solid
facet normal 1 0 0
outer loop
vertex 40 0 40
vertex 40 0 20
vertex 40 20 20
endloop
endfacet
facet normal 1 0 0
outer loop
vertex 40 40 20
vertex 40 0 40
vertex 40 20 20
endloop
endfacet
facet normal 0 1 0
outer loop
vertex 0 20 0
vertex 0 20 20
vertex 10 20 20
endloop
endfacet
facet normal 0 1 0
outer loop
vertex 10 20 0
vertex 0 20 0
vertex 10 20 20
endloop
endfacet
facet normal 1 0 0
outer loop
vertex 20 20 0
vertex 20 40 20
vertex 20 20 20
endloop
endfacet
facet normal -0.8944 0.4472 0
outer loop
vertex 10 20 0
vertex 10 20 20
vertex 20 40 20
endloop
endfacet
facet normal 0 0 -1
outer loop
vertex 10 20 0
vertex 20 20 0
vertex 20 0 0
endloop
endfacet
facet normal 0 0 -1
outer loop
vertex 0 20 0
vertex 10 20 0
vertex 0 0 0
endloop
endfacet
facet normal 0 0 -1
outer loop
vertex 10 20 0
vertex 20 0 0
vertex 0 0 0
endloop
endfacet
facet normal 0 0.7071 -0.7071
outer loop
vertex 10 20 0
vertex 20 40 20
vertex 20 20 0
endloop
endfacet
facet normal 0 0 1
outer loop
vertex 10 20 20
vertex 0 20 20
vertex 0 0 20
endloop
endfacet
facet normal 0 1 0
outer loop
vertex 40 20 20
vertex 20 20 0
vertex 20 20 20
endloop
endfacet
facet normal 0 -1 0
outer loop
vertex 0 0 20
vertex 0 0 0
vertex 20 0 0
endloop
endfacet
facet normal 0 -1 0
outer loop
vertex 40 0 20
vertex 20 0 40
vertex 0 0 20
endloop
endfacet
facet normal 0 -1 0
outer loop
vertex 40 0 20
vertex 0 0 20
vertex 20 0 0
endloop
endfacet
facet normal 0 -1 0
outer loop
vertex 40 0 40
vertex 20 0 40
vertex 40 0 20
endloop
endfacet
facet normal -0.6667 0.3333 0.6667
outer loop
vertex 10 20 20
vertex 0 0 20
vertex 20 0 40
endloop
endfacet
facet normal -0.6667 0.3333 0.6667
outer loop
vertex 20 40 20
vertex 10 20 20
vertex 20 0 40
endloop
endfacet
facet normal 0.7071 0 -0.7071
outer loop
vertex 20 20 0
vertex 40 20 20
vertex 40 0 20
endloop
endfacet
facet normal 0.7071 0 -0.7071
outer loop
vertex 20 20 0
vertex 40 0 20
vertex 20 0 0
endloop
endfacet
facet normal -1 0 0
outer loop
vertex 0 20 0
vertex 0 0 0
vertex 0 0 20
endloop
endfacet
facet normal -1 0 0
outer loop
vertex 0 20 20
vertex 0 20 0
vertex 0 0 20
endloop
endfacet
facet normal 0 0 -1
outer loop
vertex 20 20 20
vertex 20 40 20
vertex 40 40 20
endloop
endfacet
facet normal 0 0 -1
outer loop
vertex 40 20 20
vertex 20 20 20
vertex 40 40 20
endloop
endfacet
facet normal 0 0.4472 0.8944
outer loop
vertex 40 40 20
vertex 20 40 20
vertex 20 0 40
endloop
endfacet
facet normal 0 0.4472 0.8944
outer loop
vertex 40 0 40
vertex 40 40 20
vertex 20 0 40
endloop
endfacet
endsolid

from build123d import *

# Parameters (mm, degrees)
SKETCH1_W           = 40
SKETCH1_H           = 20
BOSS_EXTRUDE1_DEPTH = 40
CUT_EXTRUDE1_DEPTH  = 40
CUT_EXTRUDE2_DEPTH  = 40
BOSS_EXTRUDE2_DEPTH = 20
BOSS_EXTRUDE3_DEPTH = 20
SKETCH6_W           = 40
SKETCH6_H           = 40
CUT_EXTRUDE3_DEPTH  = 20
SKETCH7_W           = 28.284271247
SKETCH7_H           = 20
CUT_EXTRUDE4_DEPTH  = 20
SKETCH8_W           = 20
SKETCH8_H           = 20
CUT_EXTRUDE5_DEPTH  = 20
CUT_EXTRUDE6_DEPTH  = 20
CUT_EXTRUDE7_DEPTH  = 20
SKETCH11_W          = 20
SKETCH11_H          = 20
CUT_EXTRUDE8_DEPTH  = 20
SKETCH12_W          = 20
SKETCH12_H          = 20
BOSS_EXTRUDE4_DEPTH = 20
CUT_EXTRUDE9_DEPTH  = 20
CUT_EXTRUDE10_DEPTH = 20


with BuildPart() as part:
    # Sketch1 → Boss-Extrude1 (new body)
    with BuildSketch(Plane.XY):
        with Locations((20, 10)):
            Rectangle(SKETCH1_W, SKETCH1_H)
    extrude(amount=BOSS_EXTRUDE1_DEPTH)

    # Sketch2 → Cut-Extrude1 (cut)
    with BuildSketch(Plane(origin=(0, 20, 0), x_dir=(1, 0, 0), z_dir=(0, 1, 0))):
        Polygon((0, -20), (20, -40), (0, -40), align=None)
    extrude(amount=-CUT_EXTRUDE1_DEPTH, mode=Mode.SUBTRACT)

    # Sketch3 → Cut-Extrude2 (cut)
    with BuildSketch(Plane(origin=(0, 20, 0), x_dir=(1, 0, 0), z_dir=(0, 1, 0))):
        Polygon((20, -40), (20, -20), (0, -20), align=None)
    extrude(amount=-CUT_EXTRUDE2_DEPTH, mode=Mode.SUBTRACT)

    # Sketch4 → Boss-Extrude2 (add)
    with BuildSketch(Plane(origin=(0, 20, 0), x_dir=(1, 0, 0), z_dir=(0, 1, 0))):
        Polygon((0, 0), (0, -20), (40, -20), (20, 0), align=None)
    extrude(amount=BOSS_EXTRUDE2_DEPTH)

    # Sketch5 → Boss-Extrude3 (add)
    with BuildSketch(Plane(origin=(-8.888888889, 4.444444444, 8.888888889), x_dir=(0.745355992, 0.298142397, 0.596284794), z_dir=(-0.666666667, 0.333333333, 0.666666667))):
        Polygon((11.92569588, -8.94427191), (38.75851161, -17.88854382), (38.75851161, 26.83281573), align=None)
    extrude(amount=-BOSS_EXTRUDE3_DEPTH)

    # Sketch6 → Cut-Extrude3 (cut)
    with BuildSketch(Plane.XZ):
        with Locations((20, 20)):
            Rectangle(SKETCH6_W, SKETCH6_H)
    extrude(amount=CUT_EXTRUDE3_DEPTH, mode=Mode.SUBTRACT)

    # Sketch7 → Cut-Extrude4 (cut)
    with BuildSketch(Plane(origin=(10, 0, -10), x_dir=(-0.707106781, 0, -0.707106781), z_dir=(0.707106781, 0, -0.707106781))):
        with Locations((-28.284271248, 30)):
            Rectangle(SKETCH7_W, SKETCH7_H)
    extrude(amount=CUT_EXTRUDE4_DEPTH, mode=Mode.SUBTRACT)

    # Sketch8 → Cut-Extrude5 (cut)
    with BuildSketch(Plane(origin=(20, 0, 0), x_dir=(0, 0, -1), z_dir=(1, 0, 0))):
        with Locations((-30, 30)):
            Rectangle(SKETCH8_W, SKETCH8_H)
    extrude(amount=CUT_EXTRUDE5_DEPTH, mode=Mode.SUBTRACT)

    # Sketch9 → Cut-Extrude6 (cut)
    with BuildSketch(Plane.XY.offset(20)):
        Polygon((0, 40), (0, 20), (10, 20), (20, 40), align=None)
    extrude(amount=-CUT_EXTRUDE6_DEPTH, mode=Mode.SUBTRACT)

    # Sketch10 → Cut-Extrude7 (cut)
    with BuildSketch(Plane(origin=(0, 20, 0), x_dir=(1, 0, 0), z_dir=(0, 1, 0))):
        Polygon((40, 0), (40, -20), (20, 0), align=None)
    extrude(amount=-CUT_EXTRUDE7_DEPTH, mode=Mode.SUBTRACT)

    # Sketch11 → Cut-Extrude8 (cut)
    with BuildSketch(Plane.XY.offset(20)):
        with Locations((30, 30)):
            Rectangle(SKETCH11_W, SKETCH11_H)
    extrude(amount=-CUT_EXTRUDE8_DEPTH, mode=Mode.SUBTRACT)

    # Sketch12 → Boss-Extrude4 (add)
    with BuildSketch(Plane.XY.offset(40)):
        with Locations((30, 30)):
            Rectangle(SKETCH12_W, SKETCH12_H)
    extrude(amount=-BOSS_EXTRUDE4_DEPTH)

    # Sketch14 → Cut-Extrude9 (cut)
    with BuildSketch(Plane(origin=(20, 0, 0), x_dir=(0, 0, -1), z_dir=(1, 0, 0))):
        Polygon((-20, 40), (-10, 30), (0, 40), align=None)
        Polygon((0, 40), (-10, 30), (0, 20), align=None)
    extrude(amount=-CUT_EXTRUDE9_DEPTH, mode=Mode.SUBTRACT)

    # Sketch15 → Cut-Extrude10 (cut)
    with BuildSketch(Plane.ZY.offset(-20)):
        Polygon((20, 40), (40, 0), (40, 40), align=None)
    extrude(amount=-CUT_EXTRUDE10_DEPTH, mode=Mode.SUBTRACT)


solid = part.part
